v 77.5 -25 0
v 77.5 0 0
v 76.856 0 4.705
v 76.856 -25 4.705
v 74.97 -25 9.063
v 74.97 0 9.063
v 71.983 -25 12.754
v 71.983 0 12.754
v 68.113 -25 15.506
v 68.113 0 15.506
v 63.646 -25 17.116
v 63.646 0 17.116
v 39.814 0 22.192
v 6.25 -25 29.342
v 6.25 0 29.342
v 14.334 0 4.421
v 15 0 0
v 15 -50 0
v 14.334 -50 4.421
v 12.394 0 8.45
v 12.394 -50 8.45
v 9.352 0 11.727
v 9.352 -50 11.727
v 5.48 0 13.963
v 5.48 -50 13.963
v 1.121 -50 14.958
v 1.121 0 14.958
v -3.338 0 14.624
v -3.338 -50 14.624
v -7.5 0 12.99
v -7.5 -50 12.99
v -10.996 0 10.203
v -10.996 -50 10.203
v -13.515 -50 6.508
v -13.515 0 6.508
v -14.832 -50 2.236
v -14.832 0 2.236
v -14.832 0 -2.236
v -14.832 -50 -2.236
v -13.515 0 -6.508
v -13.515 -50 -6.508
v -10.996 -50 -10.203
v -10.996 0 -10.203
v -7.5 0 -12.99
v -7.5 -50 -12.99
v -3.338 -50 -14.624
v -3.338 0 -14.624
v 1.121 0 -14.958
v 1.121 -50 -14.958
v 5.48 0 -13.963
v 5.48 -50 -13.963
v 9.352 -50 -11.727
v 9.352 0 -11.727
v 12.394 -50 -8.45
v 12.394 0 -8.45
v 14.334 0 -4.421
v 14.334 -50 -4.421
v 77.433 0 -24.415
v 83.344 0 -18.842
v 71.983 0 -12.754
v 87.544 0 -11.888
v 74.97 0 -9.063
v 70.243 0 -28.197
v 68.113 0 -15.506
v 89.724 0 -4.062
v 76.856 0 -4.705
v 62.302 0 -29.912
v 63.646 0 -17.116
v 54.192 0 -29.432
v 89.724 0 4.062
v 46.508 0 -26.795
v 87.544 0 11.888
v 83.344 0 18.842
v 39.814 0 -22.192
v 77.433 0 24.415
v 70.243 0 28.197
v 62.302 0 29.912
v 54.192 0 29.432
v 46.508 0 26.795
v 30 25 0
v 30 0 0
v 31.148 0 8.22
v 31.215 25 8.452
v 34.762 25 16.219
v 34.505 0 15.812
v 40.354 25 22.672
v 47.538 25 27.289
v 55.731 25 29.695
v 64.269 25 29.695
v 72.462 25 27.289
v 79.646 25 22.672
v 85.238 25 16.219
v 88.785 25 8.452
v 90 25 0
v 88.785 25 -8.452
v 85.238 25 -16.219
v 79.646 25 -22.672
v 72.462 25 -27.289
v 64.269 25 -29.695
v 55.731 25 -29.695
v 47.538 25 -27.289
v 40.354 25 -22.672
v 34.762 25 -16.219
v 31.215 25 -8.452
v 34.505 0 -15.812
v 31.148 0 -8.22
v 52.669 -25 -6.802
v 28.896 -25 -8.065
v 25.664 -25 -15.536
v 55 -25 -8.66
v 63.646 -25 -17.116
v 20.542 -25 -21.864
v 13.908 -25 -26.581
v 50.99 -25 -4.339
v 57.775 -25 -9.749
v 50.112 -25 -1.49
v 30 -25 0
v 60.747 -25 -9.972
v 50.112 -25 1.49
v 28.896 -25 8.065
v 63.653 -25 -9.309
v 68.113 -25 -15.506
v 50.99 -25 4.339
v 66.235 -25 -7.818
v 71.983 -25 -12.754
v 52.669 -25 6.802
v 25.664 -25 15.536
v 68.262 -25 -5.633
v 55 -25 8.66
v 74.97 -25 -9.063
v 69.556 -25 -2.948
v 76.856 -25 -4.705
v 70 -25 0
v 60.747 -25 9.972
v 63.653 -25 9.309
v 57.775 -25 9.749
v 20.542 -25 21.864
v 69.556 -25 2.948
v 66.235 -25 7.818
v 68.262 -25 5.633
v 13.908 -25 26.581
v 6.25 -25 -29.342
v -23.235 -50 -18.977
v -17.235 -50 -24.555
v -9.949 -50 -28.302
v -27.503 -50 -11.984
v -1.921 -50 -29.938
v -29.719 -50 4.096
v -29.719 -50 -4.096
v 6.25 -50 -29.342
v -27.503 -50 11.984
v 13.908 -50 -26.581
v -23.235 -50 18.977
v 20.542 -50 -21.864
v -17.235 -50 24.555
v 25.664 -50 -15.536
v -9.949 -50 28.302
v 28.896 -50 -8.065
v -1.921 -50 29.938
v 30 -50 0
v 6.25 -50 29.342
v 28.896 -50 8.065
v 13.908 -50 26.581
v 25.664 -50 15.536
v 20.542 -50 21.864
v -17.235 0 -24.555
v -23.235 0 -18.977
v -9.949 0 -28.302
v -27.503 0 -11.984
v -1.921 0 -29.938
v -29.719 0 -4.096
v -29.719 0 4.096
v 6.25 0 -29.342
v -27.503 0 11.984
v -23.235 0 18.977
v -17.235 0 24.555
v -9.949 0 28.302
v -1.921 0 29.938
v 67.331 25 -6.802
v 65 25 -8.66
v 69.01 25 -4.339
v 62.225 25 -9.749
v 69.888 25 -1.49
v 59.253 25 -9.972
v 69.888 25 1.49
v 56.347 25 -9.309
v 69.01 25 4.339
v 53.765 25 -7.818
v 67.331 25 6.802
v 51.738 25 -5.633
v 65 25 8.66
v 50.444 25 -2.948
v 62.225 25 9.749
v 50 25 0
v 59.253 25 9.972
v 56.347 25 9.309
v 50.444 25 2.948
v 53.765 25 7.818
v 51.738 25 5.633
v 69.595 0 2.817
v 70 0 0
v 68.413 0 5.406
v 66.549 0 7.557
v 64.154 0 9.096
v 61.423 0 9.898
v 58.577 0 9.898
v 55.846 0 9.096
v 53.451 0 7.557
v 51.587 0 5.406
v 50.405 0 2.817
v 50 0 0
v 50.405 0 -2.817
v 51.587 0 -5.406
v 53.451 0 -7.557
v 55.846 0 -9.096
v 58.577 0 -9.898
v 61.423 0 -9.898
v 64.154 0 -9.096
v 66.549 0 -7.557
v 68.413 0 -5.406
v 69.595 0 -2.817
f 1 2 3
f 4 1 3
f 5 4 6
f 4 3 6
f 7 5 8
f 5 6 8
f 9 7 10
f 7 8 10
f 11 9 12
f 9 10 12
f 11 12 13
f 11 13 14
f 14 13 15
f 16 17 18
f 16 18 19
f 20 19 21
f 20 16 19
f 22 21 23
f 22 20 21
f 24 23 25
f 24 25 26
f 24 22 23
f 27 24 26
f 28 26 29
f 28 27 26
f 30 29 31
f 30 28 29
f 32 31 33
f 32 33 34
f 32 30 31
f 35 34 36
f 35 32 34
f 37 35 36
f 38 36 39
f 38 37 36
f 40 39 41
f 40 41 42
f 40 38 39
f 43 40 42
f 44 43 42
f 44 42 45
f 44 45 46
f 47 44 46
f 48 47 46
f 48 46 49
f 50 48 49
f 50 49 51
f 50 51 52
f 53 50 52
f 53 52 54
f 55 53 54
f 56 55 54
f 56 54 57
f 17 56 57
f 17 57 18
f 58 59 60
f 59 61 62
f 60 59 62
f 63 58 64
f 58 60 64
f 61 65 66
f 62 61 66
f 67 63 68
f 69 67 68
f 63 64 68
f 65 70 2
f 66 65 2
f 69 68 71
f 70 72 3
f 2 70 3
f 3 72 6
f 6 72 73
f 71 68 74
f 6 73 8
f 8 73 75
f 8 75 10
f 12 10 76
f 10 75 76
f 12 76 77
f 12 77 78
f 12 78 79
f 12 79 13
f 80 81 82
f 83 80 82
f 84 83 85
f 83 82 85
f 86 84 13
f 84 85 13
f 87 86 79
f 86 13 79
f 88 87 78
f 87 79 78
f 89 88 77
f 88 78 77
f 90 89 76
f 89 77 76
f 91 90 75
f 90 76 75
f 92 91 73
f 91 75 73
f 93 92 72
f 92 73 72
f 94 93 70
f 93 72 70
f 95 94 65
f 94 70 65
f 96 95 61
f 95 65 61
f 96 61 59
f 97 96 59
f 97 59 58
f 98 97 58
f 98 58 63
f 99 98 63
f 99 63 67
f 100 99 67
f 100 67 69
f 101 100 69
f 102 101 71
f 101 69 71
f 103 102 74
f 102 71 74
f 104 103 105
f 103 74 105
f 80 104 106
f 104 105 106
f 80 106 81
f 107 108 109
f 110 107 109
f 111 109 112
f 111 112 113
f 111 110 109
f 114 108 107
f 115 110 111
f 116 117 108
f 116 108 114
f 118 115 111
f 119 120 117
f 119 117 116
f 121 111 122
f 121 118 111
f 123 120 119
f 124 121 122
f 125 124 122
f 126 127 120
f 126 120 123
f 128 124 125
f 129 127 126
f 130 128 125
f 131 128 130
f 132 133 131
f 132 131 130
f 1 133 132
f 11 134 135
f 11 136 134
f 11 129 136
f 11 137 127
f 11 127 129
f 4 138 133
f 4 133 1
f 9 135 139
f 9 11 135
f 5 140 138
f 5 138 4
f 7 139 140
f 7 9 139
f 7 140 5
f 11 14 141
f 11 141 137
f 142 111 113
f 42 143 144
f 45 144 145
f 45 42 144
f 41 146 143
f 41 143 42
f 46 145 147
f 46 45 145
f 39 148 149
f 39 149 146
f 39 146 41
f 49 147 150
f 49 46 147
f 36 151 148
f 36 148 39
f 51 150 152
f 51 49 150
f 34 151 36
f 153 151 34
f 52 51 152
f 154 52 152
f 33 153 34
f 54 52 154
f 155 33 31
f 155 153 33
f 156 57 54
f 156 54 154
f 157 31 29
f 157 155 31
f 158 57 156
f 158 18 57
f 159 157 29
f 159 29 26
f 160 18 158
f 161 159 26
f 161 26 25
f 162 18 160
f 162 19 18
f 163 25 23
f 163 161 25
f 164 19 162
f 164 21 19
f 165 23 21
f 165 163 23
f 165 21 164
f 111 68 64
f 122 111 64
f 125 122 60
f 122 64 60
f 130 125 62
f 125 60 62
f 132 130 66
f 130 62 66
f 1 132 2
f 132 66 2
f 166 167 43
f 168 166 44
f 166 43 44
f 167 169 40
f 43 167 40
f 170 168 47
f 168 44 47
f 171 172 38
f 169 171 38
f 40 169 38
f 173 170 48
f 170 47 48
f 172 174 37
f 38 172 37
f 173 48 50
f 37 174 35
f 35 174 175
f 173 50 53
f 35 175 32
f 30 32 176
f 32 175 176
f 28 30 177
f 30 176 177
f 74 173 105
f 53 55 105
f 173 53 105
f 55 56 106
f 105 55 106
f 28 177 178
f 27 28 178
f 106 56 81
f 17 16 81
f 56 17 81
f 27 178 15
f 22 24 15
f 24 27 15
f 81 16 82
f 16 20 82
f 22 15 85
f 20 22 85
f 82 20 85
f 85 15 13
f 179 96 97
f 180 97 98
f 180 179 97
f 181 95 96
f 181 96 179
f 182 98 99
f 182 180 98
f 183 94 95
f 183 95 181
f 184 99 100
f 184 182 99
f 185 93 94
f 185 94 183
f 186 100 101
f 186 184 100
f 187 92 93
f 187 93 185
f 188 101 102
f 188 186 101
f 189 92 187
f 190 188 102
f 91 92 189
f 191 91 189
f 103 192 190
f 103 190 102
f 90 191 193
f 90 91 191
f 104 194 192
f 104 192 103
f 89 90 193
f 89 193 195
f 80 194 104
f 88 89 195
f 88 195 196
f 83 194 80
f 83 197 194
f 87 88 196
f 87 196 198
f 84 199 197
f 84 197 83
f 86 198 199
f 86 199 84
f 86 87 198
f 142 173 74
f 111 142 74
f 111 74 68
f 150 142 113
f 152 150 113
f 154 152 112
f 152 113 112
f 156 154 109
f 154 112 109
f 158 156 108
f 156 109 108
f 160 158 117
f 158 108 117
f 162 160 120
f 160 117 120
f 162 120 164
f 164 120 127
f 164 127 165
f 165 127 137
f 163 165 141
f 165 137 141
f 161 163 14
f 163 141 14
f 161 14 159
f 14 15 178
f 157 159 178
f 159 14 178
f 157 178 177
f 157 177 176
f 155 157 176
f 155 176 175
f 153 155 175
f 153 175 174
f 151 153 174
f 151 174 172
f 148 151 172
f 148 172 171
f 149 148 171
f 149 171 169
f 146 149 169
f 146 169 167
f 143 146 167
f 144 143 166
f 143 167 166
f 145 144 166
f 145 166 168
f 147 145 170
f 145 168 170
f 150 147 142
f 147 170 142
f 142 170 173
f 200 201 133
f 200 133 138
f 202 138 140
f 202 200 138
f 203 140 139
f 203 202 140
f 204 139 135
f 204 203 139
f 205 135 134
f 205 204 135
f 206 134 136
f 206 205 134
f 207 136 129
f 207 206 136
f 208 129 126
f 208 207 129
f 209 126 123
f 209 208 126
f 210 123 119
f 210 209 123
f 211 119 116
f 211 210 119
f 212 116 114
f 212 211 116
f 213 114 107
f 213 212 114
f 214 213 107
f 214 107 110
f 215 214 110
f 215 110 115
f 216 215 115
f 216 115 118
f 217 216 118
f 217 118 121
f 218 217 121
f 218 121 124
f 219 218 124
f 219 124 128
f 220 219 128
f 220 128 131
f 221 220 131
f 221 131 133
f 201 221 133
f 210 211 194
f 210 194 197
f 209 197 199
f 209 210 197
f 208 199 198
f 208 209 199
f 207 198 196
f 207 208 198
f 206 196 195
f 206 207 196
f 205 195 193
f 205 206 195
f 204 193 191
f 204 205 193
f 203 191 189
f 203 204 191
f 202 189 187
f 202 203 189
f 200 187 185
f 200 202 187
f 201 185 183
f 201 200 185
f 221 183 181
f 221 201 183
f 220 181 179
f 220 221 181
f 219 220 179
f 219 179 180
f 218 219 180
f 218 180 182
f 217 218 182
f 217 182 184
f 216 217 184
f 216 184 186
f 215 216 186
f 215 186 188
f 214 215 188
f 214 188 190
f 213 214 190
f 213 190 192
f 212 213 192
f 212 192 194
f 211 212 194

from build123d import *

# Parameters (mm, degrees)
F0_R     = 15
F0_R_2   = 10
F1_DEPTH = 25
F2_DEPTH = 50
F3_R     = 30
F3_R_2   = 10
F4_DEPTH = 25


# Not quite as in the source:
# - a feature names something its author has since deleted; it is built from what else it names


with BuildPart() as f1:
    # F0 (on Front) → F1 (new body)
    with BuildSketch(Plane.XZ):
        with BuildLine():
            ThreePointArc((6.25, -29.3417364858), (23.3184476327, -18.8745860882), (30, 0))
            ThreePointArc((30, 0), (23.3184476327, 18.8745860882), (6.25, 29.3417364858))
            ThreePointArc((6.25, 29.3417364858), (-30, 0), (6.25, -29.3417364858))
        make_face()
        Circle(F0_R, mode=Mode.SUBTRACT)
        with BuildLine():
            ThreePointArc((6.25, 29.3417364858), (23.3184476327, 18.8745860882), (30, 0))
            ThreePointArc((30, 0), (23.3184476327, -18.8745860882), (6.25, -29.3417364858))
            Line((6.25, -29.3417364858), (63.6458333333, -17.11601295))
            ThreePointArc((63.6458333333, -17.11601295), (42.5, 0), (63.6458333333, 17.11601295))
            Line((63.6458333333, 17.11601295), (6.25, 29.3417364858))
        make_face()
        with BuildLine():
            ThreePointArc((77.5, 0), (73.6024277858, 11.0101752181), (63.6458333333, 17.11601295))
            ThreePointArc((63.6458333333, 17.11601295), (42.5, 0), (63.6458333333, -17.11601295))
            ThreePointArc((63.6458333333, -17.11601295), (73.6024277858, -11.0101752181), (77.5, 0))
        make_face()
        with Locations((60, 0)):
            Circle(F0_R_2, mode=Mode.SUBTRACT)
    extrude(amount=F1_DEPTH)

    # F0 (on Front) → F2 (join)
    with BuildSketch(Plane.XZ):
        with BuildLine():
            ThreePointArc((6.25, -29.3417364858), (23.3184476327, -18.8745860882), (30, 0))
            ThreePointArc((30, 0), (23.3184476327, 18.8745860882), (6.25, 29.3417364858))
            ThreePointArc((6.25, 29.3417364858), (-30, 0), (6.25, -29.3417364858))
        make_face()
        Circle(F0_R, mode=Mode.SUBTRACT)
    extrude(amount=F2_DEPTH)

    # F3 (on face) → F4 (join)
    with BuildSketch(Plane(origin=(0, 0, 0), x_dir=(-1, 0, 0), z_dir=(0, 1, 0))):
        with Locations((-60, 0)):
            Circle(F3_R)
        with Locations((-60, 0)):
            Circle(F3_R_2, mode=Mode.SUBTRACT)
    extrude(amount=F4_DEPTH)


solid = f1.part
